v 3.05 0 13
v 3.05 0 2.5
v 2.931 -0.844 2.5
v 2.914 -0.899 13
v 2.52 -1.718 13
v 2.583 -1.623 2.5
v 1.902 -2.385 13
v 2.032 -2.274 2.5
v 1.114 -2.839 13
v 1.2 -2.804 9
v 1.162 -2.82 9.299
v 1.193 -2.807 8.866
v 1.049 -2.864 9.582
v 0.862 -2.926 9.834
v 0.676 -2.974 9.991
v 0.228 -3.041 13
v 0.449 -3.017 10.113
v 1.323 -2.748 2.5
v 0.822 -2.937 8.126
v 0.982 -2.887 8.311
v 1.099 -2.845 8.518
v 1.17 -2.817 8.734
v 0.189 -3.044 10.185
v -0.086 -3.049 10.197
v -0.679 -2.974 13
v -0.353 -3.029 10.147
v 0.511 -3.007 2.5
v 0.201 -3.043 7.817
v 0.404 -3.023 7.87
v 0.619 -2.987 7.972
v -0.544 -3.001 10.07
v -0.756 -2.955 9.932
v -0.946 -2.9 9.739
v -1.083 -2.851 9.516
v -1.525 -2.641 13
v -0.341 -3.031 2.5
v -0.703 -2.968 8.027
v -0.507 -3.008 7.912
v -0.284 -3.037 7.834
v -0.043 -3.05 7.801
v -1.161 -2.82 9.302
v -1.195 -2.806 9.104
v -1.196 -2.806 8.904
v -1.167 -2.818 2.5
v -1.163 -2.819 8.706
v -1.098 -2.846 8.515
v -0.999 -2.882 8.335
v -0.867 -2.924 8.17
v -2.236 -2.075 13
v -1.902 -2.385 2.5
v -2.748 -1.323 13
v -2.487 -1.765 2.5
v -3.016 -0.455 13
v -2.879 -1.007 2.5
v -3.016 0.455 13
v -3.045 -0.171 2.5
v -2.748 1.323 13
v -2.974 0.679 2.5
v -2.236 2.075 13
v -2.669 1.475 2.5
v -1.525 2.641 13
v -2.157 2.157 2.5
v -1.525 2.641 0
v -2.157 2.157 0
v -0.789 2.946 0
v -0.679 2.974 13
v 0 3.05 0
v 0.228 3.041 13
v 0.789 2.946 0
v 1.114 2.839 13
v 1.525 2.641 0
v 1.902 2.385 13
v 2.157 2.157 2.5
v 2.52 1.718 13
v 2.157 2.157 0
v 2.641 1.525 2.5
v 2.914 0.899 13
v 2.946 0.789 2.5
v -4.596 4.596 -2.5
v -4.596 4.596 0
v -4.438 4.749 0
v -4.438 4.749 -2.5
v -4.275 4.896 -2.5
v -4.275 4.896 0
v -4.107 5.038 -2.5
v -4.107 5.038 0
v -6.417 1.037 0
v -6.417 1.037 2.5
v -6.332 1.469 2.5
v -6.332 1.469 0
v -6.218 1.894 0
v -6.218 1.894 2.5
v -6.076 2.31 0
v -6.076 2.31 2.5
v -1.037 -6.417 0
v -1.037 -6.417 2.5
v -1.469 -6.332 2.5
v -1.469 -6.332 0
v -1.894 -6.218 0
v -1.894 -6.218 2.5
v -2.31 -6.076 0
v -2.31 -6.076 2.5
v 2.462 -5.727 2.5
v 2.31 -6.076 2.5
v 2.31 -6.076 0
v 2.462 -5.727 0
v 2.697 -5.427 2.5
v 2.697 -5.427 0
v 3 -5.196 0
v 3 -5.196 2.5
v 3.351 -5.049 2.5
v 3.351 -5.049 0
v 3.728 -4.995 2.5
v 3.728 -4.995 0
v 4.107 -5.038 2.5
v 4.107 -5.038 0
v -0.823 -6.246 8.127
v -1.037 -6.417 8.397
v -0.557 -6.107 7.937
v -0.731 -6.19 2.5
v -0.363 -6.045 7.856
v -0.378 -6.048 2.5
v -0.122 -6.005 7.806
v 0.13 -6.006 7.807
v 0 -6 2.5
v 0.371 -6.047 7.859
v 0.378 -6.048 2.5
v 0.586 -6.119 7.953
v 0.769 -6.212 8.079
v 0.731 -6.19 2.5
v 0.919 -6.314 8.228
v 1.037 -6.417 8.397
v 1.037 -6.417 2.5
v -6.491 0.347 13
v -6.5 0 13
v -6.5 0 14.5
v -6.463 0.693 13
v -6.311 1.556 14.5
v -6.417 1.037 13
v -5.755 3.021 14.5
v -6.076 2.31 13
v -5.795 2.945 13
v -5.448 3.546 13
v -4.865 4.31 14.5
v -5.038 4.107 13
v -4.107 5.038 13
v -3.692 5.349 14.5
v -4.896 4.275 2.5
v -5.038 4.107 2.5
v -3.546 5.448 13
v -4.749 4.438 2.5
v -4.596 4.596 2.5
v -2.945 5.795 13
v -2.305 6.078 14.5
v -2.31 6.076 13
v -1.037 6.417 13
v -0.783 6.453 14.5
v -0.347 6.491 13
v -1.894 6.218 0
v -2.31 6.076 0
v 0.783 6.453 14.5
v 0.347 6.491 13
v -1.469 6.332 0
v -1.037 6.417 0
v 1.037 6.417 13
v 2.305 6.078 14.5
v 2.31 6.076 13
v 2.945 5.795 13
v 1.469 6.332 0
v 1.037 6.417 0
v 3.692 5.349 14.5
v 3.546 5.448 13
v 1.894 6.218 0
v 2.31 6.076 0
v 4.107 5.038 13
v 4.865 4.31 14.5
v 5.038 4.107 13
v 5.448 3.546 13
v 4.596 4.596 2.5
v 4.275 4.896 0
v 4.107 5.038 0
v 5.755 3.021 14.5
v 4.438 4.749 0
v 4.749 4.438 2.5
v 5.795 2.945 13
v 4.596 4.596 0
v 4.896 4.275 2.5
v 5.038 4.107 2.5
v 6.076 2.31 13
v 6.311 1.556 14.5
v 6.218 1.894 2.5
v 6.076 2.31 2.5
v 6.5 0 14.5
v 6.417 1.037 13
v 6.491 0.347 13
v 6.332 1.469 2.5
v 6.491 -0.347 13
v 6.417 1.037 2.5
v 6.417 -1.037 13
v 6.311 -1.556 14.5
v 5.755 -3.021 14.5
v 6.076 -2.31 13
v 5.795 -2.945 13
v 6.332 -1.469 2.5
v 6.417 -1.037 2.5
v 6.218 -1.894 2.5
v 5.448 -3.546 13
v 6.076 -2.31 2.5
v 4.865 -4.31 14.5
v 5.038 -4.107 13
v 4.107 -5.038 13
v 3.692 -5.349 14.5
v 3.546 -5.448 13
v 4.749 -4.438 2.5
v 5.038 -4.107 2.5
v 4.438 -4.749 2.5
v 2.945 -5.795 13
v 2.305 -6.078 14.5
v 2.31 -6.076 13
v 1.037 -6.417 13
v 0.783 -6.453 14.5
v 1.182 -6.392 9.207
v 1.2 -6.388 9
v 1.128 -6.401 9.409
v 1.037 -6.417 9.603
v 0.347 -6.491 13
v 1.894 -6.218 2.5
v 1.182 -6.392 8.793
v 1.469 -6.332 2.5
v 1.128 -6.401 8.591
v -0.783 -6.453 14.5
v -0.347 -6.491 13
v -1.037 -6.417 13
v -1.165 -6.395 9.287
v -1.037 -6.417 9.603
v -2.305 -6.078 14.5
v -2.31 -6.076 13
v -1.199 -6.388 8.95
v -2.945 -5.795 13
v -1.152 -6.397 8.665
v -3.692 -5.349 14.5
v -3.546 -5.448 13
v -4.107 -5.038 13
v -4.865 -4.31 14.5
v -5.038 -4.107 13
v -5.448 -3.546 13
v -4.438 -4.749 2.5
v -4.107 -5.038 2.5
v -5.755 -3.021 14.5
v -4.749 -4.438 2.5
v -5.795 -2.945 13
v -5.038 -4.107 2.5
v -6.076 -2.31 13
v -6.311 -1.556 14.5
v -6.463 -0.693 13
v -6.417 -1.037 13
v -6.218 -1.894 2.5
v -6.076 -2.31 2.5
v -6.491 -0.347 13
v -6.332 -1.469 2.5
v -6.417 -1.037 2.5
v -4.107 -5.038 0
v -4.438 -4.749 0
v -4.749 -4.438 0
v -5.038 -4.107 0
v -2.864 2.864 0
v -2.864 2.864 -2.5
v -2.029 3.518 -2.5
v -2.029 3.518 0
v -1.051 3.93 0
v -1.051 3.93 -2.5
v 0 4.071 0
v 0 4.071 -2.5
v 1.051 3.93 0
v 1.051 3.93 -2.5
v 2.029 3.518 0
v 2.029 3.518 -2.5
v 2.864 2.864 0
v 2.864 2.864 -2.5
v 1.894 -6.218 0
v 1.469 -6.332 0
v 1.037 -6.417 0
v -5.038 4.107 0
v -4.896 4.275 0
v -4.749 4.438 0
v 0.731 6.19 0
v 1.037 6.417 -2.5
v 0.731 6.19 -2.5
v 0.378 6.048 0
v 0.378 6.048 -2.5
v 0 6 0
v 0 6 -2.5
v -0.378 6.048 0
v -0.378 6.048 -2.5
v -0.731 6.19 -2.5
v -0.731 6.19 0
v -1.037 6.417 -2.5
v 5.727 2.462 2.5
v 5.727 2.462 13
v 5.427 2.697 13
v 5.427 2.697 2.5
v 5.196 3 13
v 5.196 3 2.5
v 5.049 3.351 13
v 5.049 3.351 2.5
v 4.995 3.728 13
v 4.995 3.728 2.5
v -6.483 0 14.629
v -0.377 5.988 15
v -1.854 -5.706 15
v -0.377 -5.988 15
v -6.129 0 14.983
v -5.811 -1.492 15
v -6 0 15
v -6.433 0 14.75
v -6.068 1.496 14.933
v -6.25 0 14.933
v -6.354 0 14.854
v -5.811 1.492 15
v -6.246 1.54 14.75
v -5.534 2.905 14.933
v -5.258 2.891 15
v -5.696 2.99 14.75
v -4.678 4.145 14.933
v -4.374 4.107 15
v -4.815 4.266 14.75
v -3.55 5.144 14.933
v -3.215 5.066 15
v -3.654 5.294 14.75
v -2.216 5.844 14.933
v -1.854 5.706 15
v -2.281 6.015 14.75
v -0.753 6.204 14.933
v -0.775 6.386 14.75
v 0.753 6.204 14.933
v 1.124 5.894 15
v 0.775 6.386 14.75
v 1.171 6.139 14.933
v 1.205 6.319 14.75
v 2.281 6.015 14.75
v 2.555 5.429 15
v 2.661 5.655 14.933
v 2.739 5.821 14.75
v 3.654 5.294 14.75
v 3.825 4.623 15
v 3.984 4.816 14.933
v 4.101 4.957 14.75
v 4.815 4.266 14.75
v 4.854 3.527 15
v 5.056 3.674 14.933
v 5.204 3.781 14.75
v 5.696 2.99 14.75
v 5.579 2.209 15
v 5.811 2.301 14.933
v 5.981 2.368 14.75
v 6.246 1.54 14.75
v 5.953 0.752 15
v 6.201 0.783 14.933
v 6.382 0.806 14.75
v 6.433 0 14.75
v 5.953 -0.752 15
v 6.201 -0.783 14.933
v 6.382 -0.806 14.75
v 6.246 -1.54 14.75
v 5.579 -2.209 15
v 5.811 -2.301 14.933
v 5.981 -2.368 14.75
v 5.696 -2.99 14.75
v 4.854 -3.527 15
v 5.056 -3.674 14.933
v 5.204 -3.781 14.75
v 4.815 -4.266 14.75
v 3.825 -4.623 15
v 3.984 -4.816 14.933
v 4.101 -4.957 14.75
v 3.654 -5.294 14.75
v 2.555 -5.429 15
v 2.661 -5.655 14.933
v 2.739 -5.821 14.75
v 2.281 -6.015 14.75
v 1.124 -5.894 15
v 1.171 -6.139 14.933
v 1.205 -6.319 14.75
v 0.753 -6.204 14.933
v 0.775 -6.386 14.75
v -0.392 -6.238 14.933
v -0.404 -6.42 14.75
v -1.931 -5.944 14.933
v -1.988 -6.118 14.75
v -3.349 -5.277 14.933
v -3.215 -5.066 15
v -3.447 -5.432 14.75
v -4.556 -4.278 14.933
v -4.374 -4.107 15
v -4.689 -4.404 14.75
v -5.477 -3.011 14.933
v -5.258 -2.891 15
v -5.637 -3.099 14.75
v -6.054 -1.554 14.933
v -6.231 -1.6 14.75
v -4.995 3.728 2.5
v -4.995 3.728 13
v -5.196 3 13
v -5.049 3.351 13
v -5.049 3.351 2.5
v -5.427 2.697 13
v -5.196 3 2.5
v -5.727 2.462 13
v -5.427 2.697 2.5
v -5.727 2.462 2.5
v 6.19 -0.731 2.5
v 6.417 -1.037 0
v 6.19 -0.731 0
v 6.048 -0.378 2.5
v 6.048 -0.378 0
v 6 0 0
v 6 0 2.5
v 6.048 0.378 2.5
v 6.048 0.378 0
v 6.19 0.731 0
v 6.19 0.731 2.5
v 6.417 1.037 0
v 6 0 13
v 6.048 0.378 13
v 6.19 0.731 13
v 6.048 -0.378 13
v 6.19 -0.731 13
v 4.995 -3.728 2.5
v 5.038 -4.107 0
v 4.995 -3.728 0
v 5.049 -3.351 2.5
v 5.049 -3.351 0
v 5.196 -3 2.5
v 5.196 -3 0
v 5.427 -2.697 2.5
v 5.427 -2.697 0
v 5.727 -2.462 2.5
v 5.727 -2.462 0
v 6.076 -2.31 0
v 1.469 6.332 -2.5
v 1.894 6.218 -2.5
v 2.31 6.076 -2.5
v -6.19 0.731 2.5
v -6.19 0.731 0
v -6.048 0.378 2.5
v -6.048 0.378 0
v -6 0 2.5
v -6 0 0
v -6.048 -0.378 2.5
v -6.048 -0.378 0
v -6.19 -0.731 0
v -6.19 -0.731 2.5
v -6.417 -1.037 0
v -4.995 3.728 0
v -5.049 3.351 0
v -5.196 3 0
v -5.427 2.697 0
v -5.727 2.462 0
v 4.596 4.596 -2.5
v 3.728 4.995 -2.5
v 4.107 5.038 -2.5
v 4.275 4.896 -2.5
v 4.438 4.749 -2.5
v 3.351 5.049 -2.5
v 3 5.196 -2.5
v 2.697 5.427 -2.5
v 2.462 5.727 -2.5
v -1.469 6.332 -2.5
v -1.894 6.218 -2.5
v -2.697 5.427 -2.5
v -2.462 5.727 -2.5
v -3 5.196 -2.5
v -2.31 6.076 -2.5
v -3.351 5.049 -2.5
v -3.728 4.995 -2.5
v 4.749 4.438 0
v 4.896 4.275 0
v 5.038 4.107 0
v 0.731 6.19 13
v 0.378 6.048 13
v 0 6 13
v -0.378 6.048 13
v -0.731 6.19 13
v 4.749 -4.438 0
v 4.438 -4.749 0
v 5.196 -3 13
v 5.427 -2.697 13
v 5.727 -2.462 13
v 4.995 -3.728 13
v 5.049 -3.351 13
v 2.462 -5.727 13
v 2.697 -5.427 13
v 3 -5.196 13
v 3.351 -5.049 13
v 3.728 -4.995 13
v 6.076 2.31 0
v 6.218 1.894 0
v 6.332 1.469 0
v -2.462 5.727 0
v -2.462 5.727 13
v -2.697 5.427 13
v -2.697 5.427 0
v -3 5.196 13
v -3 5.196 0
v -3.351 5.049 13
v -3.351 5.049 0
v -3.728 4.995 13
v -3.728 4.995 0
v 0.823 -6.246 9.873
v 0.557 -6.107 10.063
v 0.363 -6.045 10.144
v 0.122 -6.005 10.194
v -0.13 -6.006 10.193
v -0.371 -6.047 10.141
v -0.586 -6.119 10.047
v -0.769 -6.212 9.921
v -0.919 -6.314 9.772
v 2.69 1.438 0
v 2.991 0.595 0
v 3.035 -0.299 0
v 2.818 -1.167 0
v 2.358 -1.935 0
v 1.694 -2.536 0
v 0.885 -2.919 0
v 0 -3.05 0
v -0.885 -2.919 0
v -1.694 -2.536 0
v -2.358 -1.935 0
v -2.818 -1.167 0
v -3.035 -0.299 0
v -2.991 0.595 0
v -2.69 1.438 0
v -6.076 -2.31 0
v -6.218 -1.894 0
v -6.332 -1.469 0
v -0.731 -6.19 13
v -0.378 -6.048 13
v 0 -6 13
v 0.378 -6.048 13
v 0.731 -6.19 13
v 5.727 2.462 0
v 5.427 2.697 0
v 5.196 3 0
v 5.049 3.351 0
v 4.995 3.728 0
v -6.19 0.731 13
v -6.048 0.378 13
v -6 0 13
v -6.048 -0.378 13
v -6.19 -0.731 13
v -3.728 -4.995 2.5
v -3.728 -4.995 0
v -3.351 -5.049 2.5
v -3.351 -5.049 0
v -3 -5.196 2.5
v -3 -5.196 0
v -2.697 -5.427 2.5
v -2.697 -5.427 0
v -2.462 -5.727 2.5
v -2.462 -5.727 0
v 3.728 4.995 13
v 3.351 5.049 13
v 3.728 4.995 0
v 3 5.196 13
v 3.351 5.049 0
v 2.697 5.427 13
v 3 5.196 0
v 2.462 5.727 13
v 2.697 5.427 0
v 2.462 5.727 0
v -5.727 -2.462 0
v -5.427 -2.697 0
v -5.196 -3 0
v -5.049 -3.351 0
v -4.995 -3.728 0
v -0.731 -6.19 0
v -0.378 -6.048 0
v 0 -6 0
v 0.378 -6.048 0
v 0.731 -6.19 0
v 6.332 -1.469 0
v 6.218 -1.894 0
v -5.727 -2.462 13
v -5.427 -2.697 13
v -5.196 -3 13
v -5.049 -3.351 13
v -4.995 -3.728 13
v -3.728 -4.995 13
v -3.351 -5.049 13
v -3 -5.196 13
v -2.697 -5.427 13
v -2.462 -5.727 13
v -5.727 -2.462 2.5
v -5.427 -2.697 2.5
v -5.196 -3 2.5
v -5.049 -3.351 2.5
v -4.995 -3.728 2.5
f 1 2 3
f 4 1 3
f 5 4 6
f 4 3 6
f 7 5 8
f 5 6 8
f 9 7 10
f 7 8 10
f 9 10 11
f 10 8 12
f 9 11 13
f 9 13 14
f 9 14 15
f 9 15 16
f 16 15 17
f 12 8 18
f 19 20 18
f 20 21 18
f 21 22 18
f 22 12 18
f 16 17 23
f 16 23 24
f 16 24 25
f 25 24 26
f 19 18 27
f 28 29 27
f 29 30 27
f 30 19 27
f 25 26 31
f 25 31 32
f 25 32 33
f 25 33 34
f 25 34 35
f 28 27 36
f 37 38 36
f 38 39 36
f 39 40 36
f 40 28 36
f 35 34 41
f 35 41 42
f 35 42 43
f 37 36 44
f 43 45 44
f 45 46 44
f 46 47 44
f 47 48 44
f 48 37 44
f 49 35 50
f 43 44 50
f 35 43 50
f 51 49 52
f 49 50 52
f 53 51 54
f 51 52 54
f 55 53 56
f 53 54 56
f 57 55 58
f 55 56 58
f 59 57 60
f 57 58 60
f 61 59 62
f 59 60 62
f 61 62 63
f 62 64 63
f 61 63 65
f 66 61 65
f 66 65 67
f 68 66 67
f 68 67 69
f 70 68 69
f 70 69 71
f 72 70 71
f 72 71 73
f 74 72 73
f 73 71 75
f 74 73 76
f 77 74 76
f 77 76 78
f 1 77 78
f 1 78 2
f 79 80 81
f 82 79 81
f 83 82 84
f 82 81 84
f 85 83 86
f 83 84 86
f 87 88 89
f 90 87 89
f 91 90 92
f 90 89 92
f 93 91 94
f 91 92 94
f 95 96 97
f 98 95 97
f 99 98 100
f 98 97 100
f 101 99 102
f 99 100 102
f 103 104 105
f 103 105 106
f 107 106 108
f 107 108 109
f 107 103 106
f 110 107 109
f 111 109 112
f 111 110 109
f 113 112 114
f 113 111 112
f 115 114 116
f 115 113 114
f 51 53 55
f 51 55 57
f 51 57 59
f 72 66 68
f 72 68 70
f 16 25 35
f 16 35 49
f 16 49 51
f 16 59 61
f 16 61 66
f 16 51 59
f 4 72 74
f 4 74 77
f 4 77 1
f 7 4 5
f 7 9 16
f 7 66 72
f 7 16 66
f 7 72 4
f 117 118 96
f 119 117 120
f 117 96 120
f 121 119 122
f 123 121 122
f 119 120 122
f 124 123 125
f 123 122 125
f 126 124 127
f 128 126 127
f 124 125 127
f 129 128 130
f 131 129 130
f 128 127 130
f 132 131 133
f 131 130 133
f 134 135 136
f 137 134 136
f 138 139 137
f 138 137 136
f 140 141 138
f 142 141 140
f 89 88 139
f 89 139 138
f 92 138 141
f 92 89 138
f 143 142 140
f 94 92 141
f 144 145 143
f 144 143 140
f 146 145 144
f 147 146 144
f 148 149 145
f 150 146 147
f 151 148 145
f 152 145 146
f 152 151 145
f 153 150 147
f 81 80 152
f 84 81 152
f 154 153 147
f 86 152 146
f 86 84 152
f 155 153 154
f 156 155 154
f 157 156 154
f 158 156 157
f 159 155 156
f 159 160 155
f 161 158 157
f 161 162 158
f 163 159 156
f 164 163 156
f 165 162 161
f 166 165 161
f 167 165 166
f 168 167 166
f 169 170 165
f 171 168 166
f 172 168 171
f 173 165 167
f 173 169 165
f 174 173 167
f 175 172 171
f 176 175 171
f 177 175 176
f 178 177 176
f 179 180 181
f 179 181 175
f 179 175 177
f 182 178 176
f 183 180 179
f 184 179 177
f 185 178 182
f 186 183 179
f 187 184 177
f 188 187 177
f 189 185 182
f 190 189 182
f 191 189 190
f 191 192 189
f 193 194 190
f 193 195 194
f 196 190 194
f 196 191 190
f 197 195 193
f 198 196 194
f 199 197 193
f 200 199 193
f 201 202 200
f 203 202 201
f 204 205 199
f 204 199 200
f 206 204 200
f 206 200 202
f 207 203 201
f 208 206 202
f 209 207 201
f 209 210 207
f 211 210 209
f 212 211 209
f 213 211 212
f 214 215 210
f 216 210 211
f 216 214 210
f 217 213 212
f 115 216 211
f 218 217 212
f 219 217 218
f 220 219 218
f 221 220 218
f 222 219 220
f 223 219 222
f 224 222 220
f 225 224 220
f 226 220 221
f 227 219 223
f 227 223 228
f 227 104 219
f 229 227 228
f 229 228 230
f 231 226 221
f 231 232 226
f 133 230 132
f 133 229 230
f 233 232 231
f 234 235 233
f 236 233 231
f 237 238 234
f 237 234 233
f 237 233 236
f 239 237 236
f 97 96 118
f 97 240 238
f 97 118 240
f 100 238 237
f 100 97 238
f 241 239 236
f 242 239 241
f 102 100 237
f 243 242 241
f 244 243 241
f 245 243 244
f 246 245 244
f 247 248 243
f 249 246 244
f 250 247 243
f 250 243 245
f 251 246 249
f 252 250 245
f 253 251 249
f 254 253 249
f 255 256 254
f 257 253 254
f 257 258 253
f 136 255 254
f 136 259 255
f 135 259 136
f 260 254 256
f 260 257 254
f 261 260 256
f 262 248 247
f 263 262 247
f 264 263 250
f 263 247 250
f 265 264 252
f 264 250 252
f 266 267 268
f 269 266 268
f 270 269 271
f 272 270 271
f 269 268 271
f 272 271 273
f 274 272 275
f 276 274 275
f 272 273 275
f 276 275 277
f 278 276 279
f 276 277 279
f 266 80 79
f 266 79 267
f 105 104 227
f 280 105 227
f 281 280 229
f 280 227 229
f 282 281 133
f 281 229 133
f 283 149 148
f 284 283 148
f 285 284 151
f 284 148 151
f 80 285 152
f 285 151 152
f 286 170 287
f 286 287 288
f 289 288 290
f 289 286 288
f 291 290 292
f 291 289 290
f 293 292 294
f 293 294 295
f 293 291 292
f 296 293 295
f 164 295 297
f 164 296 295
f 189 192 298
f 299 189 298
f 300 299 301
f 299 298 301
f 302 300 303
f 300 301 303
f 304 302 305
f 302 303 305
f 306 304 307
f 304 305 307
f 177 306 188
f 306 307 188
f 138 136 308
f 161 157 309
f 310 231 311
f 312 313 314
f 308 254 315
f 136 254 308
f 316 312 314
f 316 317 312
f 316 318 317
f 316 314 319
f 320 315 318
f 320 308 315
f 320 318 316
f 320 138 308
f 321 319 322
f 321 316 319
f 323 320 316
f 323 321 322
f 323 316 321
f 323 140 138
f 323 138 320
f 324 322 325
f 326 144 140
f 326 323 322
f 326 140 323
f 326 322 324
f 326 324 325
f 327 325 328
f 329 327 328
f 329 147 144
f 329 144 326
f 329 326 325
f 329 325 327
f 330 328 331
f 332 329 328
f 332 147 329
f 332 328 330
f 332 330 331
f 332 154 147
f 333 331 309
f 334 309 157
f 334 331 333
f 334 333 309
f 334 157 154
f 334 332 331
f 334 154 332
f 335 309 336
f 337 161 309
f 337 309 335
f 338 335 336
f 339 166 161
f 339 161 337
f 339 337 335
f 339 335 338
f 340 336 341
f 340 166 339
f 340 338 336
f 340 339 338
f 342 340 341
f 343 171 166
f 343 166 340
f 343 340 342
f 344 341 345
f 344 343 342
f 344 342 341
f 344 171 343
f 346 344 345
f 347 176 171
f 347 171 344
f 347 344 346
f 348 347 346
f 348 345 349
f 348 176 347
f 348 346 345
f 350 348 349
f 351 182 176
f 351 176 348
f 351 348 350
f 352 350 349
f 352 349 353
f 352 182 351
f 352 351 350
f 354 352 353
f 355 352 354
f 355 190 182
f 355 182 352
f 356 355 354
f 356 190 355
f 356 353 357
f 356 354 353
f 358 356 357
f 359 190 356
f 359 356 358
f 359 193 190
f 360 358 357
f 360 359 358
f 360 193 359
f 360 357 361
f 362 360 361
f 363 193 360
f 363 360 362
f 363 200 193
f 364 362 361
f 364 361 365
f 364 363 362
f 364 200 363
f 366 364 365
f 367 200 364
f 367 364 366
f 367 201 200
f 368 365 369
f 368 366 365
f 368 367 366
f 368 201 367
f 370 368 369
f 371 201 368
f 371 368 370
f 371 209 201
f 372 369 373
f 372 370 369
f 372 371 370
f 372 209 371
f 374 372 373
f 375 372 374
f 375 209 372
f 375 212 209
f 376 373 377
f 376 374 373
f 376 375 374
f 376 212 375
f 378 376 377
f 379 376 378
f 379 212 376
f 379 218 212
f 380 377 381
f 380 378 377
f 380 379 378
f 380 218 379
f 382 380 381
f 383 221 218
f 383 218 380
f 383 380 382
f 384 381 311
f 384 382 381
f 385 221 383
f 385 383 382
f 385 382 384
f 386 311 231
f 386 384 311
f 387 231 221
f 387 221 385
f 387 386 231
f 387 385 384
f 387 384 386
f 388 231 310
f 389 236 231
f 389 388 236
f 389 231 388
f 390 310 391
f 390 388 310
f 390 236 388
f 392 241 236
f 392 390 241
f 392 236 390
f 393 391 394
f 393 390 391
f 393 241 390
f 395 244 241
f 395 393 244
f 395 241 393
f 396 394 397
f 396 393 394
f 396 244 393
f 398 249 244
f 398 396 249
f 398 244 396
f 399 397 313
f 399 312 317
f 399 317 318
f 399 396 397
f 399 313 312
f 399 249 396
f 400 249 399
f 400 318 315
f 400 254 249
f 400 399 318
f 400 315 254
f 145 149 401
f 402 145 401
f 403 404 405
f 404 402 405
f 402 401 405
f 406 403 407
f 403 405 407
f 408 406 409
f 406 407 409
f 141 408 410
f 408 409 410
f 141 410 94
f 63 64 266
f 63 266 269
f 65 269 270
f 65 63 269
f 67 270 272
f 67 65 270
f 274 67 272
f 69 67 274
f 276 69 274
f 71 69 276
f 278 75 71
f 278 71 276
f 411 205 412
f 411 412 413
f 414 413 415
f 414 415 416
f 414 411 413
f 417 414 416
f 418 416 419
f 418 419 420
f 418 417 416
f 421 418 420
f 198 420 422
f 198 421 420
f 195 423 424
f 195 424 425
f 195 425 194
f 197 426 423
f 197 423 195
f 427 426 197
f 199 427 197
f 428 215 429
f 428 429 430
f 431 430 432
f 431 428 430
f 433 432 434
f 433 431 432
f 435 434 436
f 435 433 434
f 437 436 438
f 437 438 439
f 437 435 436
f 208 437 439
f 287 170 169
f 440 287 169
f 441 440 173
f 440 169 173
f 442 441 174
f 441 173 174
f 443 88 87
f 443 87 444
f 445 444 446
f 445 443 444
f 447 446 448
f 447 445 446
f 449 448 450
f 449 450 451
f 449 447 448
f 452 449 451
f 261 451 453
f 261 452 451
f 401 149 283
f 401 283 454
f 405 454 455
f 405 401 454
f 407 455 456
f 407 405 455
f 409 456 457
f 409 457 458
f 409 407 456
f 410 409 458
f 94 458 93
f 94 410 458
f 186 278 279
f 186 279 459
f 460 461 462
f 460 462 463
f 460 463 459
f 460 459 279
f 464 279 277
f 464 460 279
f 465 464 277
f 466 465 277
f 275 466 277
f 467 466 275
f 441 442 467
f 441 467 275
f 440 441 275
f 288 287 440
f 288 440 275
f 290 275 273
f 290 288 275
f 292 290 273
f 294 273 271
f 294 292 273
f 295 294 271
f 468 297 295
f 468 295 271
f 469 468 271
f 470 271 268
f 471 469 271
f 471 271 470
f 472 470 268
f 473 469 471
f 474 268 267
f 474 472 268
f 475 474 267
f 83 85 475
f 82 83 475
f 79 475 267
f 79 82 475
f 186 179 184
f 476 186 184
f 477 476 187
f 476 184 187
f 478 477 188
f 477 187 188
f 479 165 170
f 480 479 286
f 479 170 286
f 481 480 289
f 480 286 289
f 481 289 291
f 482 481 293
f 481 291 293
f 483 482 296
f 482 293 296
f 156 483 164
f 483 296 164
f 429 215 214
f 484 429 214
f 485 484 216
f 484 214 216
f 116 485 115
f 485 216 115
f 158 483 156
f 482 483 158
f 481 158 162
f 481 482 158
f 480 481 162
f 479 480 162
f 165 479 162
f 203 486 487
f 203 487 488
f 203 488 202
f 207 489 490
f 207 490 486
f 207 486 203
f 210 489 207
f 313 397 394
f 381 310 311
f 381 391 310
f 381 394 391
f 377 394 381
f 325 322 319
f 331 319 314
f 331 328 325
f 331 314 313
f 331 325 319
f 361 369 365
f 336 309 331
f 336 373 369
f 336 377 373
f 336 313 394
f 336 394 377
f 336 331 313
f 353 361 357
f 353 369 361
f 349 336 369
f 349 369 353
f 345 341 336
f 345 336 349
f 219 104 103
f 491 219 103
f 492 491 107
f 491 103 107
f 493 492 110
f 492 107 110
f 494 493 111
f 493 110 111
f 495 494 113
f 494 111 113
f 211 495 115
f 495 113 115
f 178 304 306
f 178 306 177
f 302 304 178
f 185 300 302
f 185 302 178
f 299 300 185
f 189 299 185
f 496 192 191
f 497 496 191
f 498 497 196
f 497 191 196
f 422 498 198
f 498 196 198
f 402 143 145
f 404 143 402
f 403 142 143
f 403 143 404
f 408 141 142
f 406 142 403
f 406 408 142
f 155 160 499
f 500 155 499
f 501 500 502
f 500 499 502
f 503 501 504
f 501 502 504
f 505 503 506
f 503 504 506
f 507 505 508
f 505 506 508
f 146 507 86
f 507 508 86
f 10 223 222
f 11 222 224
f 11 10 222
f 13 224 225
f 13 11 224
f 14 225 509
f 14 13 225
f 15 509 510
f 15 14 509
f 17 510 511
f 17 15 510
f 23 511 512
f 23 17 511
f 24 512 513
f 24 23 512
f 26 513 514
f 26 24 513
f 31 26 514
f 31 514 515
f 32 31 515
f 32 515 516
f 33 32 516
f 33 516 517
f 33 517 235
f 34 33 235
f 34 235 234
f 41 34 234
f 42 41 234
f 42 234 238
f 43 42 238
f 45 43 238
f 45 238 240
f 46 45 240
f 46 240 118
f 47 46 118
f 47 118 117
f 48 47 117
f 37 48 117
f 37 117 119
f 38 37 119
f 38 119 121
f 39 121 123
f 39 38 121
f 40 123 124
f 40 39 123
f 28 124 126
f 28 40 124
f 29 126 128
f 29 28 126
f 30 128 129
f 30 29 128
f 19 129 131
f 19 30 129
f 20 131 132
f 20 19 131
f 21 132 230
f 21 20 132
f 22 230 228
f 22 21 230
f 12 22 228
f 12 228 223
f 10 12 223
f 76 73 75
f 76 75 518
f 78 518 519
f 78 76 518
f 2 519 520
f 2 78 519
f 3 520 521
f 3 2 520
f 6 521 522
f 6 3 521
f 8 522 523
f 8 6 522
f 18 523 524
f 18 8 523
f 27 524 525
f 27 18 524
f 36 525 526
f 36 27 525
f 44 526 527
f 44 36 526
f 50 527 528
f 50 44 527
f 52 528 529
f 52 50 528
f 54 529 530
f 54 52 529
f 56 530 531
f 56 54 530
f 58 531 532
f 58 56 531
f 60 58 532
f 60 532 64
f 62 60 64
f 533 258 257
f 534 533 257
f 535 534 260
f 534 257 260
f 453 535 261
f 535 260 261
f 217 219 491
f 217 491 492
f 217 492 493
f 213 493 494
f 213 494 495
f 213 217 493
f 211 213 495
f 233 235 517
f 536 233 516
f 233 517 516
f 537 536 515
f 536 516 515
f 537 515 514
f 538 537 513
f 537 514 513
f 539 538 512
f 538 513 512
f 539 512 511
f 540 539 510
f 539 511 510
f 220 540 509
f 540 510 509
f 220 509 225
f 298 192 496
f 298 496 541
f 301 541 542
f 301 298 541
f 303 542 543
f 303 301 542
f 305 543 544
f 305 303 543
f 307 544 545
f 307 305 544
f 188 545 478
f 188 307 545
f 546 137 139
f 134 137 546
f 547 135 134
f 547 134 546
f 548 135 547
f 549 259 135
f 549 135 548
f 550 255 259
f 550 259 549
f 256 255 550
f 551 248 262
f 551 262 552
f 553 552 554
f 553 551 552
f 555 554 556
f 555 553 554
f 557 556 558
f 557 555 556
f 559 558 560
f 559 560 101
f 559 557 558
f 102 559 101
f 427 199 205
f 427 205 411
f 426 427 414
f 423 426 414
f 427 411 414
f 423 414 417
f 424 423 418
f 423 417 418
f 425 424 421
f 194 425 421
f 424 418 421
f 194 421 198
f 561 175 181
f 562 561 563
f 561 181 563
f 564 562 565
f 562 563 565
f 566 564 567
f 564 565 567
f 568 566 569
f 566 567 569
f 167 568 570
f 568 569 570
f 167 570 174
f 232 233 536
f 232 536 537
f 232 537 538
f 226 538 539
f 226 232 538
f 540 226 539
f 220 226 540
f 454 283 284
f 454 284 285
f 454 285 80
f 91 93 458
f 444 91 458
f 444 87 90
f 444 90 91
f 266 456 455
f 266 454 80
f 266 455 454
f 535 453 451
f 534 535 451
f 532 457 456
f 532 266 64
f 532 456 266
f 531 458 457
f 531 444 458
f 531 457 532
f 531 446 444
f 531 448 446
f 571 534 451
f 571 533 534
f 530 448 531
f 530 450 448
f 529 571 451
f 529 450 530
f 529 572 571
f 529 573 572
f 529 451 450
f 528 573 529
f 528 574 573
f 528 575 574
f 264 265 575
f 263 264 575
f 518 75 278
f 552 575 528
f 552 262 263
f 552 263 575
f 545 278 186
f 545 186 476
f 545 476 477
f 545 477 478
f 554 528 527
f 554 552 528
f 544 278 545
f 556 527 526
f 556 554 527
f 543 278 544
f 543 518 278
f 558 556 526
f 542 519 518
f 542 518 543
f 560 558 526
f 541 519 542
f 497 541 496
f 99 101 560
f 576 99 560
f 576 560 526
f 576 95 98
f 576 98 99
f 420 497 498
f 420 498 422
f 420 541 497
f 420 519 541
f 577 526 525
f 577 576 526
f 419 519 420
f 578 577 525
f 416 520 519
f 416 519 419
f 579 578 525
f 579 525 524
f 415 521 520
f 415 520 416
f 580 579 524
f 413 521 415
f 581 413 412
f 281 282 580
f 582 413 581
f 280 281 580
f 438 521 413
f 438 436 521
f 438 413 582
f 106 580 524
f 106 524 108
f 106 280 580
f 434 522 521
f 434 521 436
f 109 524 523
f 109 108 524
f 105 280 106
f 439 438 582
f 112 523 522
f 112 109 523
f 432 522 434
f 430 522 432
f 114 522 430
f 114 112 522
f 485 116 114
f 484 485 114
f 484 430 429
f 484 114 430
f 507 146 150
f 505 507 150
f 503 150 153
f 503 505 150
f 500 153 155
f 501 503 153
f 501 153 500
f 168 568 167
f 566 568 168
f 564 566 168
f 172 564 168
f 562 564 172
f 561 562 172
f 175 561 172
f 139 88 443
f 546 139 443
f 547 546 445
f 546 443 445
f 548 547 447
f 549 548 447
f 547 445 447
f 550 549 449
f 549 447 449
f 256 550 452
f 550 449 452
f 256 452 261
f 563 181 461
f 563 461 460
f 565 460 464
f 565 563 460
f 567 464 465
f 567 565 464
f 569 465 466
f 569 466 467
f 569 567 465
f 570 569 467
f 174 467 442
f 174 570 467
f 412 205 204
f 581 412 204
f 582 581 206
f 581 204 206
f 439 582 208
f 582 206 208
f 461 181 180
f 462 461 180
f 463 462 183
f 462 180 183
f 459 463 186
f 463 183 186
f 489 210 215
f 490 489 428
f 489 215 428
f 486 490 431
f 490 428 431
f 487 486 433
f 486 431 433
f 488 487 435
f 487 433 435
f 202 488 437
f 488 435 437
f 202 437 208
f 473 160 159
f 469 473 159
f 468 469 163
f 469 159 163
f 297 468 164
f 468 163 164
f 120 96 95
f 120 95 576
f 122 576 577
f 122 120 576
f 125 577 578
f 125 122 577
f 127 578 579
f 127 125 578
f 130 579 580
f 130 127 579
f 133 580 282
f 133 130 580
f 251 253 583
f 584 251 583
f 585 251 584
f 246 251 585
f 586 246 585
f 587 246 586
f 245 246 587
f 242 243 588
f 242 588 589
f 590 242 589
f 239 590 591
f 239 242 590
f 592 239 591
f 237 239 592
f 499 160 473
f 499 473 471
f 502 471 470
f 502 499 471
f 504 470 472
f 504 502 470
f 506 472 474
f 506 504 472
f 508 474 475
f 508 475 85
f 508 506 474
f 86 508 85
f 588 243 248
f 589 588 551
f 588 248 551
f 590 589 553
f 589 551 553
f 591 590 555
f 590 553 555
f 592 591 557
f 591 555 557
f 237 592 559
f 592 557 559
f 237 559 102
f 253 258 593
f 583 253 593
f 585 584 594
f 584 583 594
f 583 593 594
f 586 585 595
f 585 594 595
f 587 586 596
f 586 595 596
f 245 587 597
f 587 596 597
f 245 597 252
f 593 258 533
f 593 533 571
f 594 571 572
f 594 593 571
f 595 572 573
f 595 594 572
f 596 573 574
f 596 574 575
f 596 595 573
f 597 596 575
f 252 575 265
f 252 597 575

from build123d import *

# Parameters (mm, degrees)
F2_R      = 3.05
F3_DEPTH  = 13
F4_R      = 0.5
F5_R      = 1.2
F6_DEPTH  = 7
F7_R      = 1.5
F8_DEPTH  = 13
F10_DEPTH = 2.5
F11_DEPTH = 2.5
F13_DEPTH = 2.5


with BuildPart() as f1:
    # F0 (on Front) → F1 (revolve)
    with BuildSketch(Plane.XZ):
        Polygon((-5, 0), (0, 0), (0, 15), (-6.5, 15), (-6.5, 0), align=None)
    revolve(axis=Axis((0, 0, -3.6677676575), (0, 0, -1)))

    # F2 (on face) → F3 (cut)
    with BuildSketch(Plane(origin=(0, 0, 0), x_dir=(1, 0, 0), z_dir=(0, 0, -1))):
        Circle(F2_R)
    extrude(amount=-F3_DEPTH, mode=Mode.SUBTRACT)

    # F4
    f4_edges = [f1.edges().sort_by_distance(p)[0] for p in [
        (6.5, 0, 15),
    ]]
    fillet(f4_edges, radius=F4_R)

    # F5 (on Front) → F6 (cut)
    with BuildSketch(Plane.XZ):
        with Locations((0, 9)):
            Circle(F5_R)
    extrude(amount=F6_DEPTH, mode=Mode.SUBTRACT)

    # F7 (on face) → F8 (cut)
    with BuildSketch(Plane(origin=(0, 0, 0), x_dir=(1, 0, 0), z_dir=(0, 0, -1))):
        with Locations((-7.5, 0)):
            Circle(F7_R)
        with Locations((-6.4951905284, -3.75)):
            Circle(F7_R)
        with Locations((-3.75, -6.4951905284)):
            Circle(F7_R)
        with Locations((0, -7.5)):
            Circle(F7_R)
        with Locations((3.75, -6.4951905284)):
            Circle(F7_R)
        with Locations((6.4951905284, -3.75)):
            Circle(F7_R)
        with Locations((7.5, 0)):
            Circle(F7_R)
        with Locations((6.4951905284, 3.75)):
            Circle(F7_R)
        with Locations((3.75, 6.4951905284)):
            Circle(F7_R)
        with Locations((0, 7.5)):
            Circle(F7_R)
        with Locations((-3.75, 6.4951905284)):
            Circle(F7_R)
        with Locations((-6.4951905284, 3.75)):
            Circle(F7_R)
    extrude(amount=-F8_DEPTH, mode=Mode.SUBTRACT)

    # F9 (on face) → F10 (cut)
    with BuildSketch(Plane(origin=(0, 0, 0), x_dir=(1, 0, 0), z_dir=(0, 0, -1))):
        with BuildLine():
            Line((-5.6568542495, -5.6568542495), (0, 0))
            Line((0, 0), (5.6568542495, -5.6568542495))
            ThreePointArc((5.6568542495, -5.6568542495), (0, 8), (-5.6568542495, -5.6568542495))
        make_face()
    extrude(amount=-F10_DEPTH, mode=Mode.SUBTRACT)

    # F11 (add): faces of the model
    f11_faces = [f1.faces().sort_by_distance(p)[0] for p in [
        (-4.6979425412, 4.2437625345, 2.5),
        (0, 4.3753680924, 0),
    ]]
    extrude(f11_faces, amount=F11_DEPTH)

    # F12 (on face) → F13 (cut)
    with BuildSketch(Plane(origin=(0, 0, -2.5), x_dir=(1, 0, 0), z_dir=(0, 0, -1))):
        with BuildLine():
            ThreePointArc((2.1566756826, -2.1566756826), (0, -3.05), (-2.1566756826, -2.1566756826))
            Line((-2.1566756826, -2.1566756826), (-2.8637824638, -2.8637824638))
            ThreePointArc((-2.8637824638, -2.8637824638), (0, -4.0711582499), (2.8637824638, -2.8637824638))
            Line((2.8637824638, -2.8637824638), (2.1566756826, -2.1566756826))
        make_face()
    extrude(amount=-F13_DEPTH, mode=Mode.SUBTRACT)


solid = f1.part
